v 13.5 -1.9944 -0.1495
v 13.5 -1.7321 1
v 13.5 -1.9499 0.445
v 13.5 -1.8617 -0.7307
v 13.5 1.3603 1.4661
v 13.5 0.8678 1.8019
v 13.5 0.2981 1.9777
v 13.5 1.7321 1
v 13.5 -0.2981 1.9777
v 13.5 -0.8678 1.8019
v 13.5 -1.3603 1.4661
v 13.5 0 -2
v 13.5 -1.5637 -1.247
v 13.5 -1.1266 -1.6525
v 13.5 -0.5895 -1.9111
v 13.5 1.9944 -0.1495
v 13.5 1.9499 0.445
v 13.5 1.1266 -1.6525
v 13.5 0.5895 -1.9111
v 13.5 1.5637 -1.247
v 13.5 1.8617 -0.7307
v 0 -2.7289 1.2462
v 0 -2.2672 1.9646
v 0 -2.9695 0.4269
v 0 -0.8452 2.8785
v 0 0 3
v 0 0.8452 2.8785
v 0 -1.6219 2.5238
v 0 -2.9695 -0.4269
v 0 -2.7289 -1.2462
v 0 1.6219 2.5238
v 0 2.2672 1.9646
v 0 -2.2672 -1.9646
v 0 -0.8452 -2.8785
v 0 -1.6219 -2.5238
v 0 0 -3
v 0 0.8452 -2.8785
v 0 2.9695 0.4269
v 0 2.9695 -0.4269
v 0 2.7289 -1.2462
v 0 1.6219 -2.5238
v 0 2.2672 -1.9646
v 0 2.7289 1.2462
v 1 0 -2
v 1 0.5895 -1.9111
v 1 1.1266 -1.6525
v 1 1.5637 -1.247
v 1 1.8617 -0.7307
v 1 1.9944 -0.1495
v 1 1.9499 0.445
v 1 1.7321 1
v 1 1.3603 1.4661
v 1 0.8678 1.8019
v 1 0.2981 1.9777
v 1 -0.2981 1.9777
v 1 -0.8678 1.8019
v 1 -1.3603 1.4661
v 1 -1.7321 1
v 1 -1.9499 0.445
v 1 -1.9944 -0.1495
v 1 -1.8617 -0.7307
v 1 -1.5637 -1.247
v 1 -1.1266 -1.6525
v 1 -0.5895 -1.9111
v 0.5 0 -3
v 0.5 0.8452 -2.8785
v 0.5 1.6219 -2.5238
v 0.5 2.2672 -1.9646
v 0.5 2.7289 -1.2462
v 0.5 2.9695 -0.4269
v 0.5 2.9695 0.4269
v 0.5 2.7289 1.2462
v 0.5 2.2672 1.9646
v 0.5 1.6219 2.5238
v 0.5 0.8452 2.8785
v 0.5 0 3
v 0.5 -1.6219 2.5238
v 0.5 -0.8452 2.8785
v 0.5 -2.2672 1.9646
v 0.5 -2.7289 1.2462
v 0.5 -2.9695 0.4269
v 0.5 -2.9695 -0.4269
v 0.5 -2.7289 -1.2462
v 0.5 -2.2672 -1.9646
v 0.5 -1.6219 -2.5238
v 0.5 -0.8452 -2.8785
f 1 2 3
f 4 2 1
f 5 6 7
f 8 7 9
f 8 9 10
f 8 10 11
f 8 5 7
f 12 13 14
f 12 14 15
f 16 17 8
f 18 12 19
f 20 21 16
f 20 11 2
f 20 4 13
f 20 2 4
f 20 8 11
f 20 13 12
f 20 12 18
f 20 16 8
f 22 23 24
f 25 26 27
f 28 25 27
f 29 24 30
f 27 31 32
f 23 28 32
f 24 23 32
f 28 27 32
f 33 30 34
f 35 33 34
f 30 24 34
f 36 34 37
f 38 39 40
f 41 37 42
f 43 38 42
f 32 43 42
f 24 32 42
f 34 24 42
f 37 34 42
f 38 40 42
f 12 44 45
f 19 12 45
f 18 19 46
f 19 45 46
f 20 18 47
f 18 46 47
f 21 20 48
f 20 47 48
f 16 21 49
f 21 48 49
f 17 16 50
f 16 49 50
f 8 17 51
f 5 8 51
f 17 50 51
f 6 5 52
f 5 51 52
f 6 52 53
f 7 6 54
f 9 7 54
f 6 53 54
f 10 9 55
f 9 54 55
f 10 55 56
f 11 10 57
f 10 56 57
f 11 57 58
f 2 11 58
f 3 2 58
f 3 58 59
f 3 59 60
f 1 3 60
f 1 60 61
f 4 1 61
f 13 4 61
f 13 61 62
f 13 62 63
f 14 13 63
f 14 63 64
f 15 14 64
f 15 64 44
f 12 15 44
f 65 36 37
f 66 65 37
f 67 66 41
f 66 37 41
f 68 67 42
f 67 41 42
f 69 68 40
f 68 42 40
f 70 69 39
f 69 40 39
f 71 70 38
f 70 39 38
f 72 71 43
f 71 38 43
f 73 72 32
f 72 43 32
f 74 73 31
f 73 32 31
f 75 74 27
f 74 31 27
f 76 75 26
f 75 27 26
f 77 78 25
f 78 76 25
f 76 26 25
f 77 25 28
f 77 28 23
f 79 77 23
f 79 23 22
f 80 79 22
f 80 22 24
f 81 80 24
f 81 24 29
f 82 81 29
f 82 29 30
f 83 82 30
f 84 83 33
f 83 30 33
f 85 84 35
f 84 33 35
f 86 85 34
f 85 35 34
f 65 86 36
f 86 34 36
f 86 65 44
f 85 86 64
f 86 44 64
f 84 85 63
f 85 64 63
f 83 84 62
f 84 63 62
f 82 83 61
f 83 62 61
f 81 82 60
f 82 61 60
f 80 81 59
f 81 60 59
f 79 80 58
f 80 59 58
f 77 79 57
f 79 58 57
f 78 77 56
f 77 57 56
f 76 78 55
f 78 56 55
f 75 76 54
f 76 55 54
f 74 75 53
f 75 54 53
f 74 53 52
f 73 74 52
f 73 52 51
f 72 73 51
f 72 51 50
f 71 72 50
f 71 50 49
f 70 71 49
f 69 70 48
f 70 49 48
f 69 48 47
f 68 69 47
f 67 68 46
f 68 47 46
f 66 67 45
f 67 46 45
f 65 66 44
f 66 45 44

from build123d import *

# Parameters (mm, degrees)
SKETCH1_R           = 3
BOSS_EXTRUDE1_DEPTH = 1
SKETCH1_4_R         = 2
BOSS_EXTRUDE2_DEPTH = 13.5


with BuildPart() as part:
    # Sketch1 → Boss-Extrude1 (new body)
    with BuildSketch(Plane.YZ):
        Circle(SKETCH1_R)
    extrude(amount=BOSS_EXTRUDE1_DEPTH)

    # Sketch1<4> → Boss-Extrude2 (add)
    with BuildSketch(Plane.YZ):
        Circle(SKETCH1_4_R)
    extrude(amount=BOSS_EXTRUDE2_DEPTH)

    # Sketch2 → Cut-Revolve1 (revolve, cut)
    with BuildSketch(Plane(origin=(0, 0, 0), x_dir=(-1, 0, 0), z_dir=(0, 1, 0))):
        Polygon((-0.5, 3), (-1, 2), (-1, 3), align=None)
    revolve(axis=Axis((0.683677116, 0, 0), (-1, 0, 0)), mode=Mode.SUBTRACT)


solid = part.part
